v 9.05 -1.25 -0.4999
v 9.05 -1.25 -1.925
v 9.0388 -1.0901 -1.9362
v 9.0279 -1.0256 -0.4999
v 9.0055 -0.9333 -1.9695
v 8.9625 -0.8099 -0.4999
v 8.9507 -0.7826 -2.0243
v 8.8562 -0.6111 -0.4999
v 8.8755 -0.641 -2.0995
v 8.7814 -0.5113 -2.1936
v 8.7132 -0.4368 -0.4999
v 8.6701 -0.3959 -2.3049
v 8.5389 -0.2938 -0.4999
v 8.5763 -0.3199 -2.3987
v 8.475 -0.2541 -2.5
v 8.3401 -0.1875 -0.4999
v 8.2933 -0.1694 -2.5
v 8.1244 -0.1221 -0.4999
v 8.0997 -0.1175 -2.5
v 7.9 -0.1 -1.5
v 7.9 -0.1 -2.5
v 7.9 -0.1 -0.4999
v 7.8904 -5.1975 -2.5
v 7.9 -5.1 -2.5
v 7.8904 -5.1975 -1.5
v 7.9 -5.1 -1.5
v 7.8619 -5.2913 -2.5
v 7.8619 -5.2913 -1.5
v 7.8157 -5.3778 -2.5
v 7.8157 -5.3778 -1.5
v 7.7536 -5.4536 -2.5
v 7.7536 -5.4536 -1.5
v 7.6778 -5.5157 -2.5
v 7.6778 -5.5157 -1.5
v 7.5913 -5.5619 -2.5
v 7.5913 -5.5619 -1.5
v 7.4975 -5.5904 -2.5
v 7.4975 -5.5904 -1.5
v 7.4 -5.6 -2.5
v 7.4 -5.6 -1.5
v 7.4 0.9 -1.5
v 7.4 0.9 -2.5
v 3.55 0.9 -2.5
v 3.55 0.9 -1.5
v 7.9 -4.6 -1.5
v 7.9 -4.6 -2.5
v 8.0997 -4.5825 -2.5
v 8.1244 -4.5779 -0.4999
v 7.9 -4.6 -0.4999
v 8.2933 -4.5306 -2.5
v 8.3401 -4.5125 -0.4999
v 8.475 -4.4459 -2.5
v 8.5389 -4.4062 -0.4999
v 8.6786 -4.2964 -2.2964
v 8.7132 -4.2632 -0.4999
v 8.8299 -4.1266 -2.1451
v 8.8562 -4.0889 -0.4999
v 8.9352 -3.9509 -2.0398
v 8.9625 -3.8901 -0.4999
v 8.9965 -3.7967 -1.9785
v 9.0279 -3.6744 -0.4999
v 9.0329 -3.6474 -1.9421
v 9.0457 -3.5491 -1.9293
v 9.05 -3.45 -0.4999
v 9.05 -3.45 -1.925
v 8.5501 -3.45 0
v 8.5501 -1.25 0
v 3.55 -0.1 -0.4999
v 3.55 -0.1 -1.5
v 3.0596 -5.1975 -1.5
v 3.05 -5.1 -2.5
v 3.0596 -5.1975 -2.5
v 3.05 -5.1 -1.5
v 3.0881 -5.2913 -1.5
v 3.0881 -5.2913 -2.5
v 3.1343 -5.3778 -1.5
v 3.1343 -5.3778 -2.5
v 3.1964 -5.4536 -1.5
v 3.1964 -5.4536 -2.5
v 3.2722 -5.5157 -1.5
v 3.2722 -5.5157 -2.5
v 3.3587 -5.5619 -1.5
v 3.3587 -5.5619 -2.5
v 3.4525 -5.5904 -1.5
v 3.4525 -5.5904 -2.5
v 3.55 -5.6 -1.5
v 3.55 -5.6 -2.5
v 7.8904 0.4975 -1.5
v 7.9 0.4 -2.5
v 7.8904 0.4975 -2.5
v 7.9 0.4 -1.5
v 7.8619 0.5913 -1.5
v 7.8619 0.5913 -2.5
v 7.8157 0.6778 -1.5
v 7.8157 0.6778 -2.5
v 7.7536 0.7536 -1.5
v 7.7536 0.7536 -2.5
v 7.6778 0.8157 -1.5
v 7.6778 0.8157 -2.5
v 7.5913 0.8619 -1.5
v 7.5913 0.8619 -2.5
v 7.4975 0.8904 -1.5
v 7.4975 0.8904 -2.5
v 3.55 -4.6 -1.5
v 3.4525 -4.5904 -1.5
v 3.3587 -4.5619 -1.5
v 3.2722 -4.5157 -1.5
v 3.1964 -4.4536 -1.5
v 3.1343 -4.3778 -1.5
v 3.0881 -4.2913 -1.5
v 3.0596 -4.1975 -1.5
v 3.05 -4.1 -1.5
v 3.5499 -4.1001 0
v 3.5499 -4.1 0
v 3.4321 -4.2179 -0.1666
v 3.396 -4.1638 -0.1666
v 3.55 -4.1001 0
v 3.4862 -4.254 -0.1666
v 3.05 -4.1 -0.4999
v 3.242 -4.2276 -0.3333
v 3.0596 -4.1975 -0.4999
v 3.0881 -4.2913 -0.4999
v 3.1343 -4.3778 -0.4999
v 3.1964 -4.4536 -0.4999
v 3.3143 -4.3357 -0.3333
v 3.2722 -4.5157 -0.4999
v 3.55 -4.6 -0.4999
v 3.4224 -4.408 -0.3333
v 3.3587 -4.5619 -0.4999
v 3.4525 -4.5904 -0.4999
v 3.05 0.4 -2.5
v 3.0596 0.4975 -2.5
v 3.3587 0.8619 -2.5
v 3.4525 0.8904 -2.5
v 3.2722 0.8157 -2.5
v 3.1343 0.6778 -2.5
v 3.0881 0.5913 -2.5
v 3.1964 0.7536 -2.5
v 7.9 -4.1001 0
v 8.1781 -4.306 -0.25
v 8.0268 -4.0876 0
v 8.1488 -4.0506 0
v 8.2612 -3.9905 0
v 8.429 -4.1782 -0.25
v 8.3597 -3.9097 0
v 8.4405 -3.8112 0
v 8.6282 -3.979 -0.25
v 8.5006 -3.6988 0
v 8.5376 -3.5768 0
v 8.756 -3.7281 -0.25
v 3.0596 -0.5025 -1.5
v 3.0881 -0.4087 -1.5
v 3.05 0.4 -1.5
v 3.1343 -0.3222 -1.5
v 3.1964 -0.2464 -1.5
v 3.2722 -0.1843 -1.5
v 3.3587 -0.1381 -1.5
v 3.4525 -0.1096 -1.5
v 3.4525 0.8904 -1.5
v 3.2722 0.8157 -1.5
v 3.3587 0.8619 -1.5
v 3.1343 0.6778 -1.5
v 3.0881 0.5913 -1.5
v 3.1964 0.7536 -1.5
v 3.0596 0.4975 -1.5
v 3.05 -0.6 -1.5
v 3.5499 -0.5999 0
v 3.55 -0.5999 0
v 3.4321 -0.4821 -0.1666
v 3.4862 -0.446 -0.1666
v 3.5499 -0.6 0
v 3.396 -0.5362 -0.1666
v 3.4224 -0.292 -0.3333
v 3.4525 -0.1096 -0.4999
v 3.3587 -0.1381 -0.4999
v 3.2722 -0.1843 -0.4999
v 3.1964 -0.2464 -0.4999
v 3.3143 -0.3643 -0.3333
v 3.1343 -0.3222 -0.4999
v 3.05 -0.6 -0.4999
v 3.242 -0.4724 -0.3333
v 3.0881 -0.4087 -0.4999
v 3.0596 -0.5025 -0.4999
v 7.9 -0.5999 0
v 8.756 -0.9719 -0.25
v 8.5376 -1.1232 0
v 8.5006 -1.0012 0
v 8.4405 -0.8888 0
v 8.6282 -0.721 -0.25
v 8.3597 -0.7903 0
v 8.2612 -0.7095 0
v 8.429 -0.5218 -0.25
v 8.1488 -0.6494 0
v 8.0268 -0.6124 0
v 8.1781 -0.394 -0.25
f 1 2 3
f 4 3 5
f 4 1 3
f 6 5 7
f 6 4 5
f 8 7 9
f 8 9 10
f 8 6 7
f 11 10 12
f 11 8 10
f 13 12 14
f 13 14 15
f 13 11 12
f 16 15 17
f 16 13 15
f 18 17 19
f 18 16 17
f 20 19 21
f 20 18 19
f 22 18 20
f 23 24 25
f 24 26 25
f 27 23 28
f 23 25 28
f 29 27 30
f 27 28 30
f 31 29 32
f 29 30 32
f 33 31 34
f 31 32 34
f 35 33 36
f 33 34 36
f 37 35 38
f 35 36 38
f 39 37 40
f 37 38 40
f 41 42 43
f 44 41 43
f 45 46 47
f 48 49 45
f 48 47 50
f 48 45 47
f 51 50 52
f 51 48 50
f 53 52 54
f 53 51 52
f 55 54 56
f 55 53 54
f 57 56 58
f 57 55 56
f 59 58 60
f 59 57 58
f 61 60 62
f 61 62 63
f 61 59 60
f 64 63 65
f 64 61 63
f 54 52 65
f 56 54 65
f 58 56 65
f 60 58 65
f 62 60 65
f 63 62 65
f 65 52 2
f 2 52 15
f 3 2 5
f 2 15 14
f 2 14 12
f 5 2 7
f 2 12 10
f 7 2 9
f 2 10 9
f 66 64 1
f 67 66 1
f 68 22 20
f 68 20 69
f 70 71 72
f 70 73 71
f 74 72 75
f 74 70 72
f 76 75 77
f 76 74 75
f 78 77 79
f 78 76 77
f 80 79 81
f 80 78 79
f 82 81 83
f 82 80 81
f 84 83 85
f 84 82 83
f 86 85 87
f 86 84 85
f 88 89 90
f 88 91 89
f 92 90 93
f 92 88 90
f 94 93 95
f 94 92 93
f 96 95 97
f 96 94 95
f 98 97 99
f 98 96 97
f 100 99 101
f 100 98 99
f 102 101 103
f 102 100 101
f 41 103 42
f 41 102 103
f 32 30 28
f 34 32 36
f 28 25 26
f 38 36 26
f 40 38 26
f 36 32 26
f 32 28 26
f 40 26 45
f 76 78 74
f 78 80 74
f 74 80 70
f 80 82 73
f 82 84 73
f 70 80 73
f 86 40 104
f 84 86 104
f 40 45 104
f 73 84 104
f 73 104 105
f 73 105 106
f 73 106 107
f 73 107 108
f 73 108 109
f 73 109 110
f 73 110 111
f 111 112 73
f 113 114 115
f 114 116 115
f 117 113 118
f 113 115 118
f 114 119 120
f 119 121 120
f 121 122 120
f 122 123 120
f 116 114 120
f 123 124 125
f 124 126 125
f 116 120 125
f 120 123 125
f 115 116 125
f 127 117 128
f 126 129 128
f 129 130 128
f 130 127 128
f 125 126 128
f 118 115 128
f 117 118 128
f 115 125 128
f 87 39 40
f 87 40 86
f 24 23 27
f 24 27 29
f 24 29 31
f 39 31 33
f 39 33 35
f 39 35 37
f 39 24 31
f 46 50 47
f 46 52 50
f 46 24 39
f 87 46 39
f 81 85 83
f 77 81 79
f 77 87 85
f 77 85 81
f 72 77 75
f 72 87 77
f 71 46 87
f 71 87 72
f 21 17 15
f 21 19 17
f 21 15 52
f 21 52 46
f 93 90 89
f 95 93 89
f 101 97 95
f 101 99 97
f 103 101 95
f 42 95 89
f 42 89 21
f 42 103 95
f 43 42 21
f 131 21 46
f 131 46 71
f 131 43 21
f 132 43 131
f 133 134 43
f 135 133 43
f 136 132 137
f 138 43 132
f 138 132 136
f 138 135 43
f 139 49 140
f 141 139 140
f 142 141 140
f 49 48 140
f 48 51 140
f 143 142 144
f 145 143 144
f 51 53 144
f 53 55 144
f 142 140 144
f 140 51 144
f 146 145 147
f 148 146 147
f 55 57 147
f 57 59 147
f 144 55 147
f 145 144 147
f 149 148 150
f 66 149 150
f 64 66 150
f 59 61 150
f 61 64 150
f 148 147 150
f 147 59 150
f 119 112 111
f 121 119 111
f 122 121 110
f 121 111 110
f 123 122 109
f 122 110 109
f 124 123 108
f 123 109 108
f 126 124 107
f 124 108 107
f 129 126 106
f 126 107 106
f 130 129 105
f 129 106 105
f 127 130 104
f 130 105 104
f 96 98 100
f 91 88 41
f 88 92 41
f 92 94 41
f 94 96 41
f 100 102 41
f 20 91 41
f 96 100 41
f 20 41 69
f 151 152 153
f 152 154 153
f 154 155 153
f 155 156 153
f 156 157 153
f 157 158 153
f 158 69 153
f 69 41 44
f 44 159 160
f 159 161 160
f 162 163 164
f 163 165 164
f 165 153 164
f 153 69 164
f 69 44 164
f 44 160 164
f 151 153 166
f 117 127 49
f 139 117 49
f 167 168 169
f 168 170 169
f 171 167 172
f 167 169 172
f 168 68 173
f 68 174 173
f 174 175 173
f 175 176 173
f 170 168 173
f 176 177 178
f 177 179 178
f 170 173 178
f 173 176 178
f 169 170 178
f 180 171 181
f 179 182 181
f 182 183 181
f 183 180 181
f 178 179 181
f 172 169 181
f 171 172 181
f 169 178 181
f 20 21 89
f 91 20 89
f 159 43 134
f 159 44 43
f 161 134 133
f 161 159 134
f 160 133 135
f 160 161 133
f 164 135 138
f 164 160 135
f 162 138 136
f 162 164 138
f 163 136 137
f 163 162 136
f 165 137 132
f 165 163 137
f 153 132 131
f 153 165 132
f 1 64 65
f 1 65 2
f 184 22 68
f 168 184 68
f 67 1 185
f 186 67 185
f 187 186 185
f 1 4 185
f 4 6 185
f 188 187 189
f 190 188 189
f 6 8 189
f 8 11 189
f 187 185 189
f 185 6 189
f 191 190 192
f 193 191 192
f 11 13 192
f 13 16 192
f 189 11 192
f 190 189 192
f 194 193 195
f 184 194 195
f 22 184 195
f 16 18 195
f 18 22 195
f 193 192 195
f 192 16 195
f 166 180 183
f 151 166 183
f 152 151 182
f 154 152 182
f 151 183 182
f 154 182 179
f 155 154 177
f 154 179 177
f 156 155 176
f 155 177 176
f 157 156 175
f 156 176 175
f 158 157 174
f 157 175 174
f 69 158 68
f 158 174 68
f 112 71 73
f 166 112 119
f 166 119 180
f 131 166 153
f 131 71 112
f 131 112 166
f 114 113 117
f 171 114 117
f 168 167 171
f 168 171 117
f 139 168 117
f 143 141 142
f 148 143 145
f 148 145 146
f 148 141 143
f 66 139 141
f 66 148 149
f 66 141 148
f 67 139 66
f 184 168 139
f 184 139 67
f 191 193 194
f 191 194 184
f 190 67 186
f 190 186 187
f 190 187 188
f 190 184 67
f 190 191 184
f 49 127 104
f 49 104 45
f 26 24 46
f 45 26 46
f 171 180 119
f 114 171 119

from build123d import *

# Parameters (mm, degrees)
EXTRUDE_1_DEPTH     = 2.5
SKETCH_2_W          = 15.8
SKETCH_2_H          = 6.5
EXTRUDE_2_DEPTH     = 1
FILLET_1_R          = 0.5
CUT_EXTRUDE_1_DEPTH = 12.419391402
SKETCH_4_W          = 12.1
SKETCH_4_H          = 6.5
CUT_EXTRUDE_2_DEPTH = 11.932177276
FILLET_2_R          = 0.5
CHAMFER_1_SIZE      = 0.5


with BuildPart() as part:
    # 草图1 → 凸台-拉伸1 (new body)
    with BuildSketch(Plane.XY):
        with BuildLine():
            Line((-9.05, -1.25), (-9.05, -3.45))
            ThreePointArc((-9.05, -3.45), (-8.713172798, -4.263172798), (-7.9, -4.6))
            Line((-7.9, -4.6), (7.9, -4.6))
            ThreePointArc((7.9, -4.6), (8.713172798, -4.263172798), (9.05, -3.45))
            Line((9.05, -3.45), (9.05, -1.25))
            ThreePointArc((9.05, -1.25), (8.713172798, -0.436827202), (7.9, -0.1))
            Line((7.9, -0.1), (-7.9, -0.1))
            ThreePointArc((-7.9, -0.1), (-8.713172798, -0.436827202), (-9.05, -1.25))
        make_face()
    extrude(amount=-EXTRUDE_1_DEPTH)

    # 草图2 → 凸台-拉伸2 (add)
    with BuildSketch(Plane(origin=(0, 0, -2.5), x_dir=(-1, 0, 0), z_dir=(0, 0, -1))):
        with Locations((0, -2.35)):
            Rectangle(SKETCH_2_W, SKETCH_2_H)
    extrude(amount=-EXTRUDE_2_DEPTH)

    # 圆角1
    fillet_1_edges = [part.edges().sort_by_distance(p)[0] for p in [
        (-7.9, 0.9, -2),
        (-7.9, -5.6, -2),
        (7.9, -5.6, -2),
        (7.9, 0.9, -2),
    ]]
    fillet(fillet_1_edges, radius=FILLET_1_R)

    # 草图3 → 切除-拉伸1 (cut, through all)
    with BuildSketch(Plane(origin=(0, 0.9, 0), x_dir=(1, 0, 0), z_dir=(0, 1, 0))):
        Polygon((8.475, 2.5), (9.05, 1.925), (9.05, 2.5), align=None)
        Polygon((-9.05, 1.925), (-9.05, 2.5), (-8.475, 2.5), align=None)
    extrude(amount=-CUT_EXTRUDE_1_DEPTH, mode=Mode.SUBTRACT)

    # 草图4 → 切除-拉伸2 (cut, through all)
    with BuildSketch(Plane(origin=(0, 0, -2.5), x_dir=(-1, 0, 0), z_dir=(0, 0, -1))):
        with Locations((3, -2.35)):
            Rectangle(SKETCH_4_W, SKETCH_4_H)
    extrude(amount=-CUT_EXTRUDE_2_DEPTH, mode=Mode.SUBTRACT)

    # 圆角2
    fillet_2_edges = [part.edges().sort_by_distance(p)[0] for p in [
        (3.05, -4.6, -0.75),
        (3.05, -0.1, -0.75),
        (3.05, 0.9, -2),
        (3.05, -5.6, -2),
    ]]
    fillet(fillet_2_edges, radius=FILLET_2_R)

    # 倒角1
    chamfer_1_edges = [part.edges().sort_by_distance(p)[0] for p in [
        (3.05, -2.35, 0),
        (5.725, -4.6, 0),
        (3.196446609, -0.246446609, 0),
        (3.196446609, -4.453553391, 0),
        (5.725, -0.1, 0),
        (8.713172798, -0.436827202, 0),
        (9.05, -2.35, 0),
        (8.713172798, -4.263172798, 0),
    ]]
    chamfer(chamfer_1_edges, length=CHAMFER_1_SIZE - 0.0001)  # a hair under: the kernel refuses the full size


solid = part.part
